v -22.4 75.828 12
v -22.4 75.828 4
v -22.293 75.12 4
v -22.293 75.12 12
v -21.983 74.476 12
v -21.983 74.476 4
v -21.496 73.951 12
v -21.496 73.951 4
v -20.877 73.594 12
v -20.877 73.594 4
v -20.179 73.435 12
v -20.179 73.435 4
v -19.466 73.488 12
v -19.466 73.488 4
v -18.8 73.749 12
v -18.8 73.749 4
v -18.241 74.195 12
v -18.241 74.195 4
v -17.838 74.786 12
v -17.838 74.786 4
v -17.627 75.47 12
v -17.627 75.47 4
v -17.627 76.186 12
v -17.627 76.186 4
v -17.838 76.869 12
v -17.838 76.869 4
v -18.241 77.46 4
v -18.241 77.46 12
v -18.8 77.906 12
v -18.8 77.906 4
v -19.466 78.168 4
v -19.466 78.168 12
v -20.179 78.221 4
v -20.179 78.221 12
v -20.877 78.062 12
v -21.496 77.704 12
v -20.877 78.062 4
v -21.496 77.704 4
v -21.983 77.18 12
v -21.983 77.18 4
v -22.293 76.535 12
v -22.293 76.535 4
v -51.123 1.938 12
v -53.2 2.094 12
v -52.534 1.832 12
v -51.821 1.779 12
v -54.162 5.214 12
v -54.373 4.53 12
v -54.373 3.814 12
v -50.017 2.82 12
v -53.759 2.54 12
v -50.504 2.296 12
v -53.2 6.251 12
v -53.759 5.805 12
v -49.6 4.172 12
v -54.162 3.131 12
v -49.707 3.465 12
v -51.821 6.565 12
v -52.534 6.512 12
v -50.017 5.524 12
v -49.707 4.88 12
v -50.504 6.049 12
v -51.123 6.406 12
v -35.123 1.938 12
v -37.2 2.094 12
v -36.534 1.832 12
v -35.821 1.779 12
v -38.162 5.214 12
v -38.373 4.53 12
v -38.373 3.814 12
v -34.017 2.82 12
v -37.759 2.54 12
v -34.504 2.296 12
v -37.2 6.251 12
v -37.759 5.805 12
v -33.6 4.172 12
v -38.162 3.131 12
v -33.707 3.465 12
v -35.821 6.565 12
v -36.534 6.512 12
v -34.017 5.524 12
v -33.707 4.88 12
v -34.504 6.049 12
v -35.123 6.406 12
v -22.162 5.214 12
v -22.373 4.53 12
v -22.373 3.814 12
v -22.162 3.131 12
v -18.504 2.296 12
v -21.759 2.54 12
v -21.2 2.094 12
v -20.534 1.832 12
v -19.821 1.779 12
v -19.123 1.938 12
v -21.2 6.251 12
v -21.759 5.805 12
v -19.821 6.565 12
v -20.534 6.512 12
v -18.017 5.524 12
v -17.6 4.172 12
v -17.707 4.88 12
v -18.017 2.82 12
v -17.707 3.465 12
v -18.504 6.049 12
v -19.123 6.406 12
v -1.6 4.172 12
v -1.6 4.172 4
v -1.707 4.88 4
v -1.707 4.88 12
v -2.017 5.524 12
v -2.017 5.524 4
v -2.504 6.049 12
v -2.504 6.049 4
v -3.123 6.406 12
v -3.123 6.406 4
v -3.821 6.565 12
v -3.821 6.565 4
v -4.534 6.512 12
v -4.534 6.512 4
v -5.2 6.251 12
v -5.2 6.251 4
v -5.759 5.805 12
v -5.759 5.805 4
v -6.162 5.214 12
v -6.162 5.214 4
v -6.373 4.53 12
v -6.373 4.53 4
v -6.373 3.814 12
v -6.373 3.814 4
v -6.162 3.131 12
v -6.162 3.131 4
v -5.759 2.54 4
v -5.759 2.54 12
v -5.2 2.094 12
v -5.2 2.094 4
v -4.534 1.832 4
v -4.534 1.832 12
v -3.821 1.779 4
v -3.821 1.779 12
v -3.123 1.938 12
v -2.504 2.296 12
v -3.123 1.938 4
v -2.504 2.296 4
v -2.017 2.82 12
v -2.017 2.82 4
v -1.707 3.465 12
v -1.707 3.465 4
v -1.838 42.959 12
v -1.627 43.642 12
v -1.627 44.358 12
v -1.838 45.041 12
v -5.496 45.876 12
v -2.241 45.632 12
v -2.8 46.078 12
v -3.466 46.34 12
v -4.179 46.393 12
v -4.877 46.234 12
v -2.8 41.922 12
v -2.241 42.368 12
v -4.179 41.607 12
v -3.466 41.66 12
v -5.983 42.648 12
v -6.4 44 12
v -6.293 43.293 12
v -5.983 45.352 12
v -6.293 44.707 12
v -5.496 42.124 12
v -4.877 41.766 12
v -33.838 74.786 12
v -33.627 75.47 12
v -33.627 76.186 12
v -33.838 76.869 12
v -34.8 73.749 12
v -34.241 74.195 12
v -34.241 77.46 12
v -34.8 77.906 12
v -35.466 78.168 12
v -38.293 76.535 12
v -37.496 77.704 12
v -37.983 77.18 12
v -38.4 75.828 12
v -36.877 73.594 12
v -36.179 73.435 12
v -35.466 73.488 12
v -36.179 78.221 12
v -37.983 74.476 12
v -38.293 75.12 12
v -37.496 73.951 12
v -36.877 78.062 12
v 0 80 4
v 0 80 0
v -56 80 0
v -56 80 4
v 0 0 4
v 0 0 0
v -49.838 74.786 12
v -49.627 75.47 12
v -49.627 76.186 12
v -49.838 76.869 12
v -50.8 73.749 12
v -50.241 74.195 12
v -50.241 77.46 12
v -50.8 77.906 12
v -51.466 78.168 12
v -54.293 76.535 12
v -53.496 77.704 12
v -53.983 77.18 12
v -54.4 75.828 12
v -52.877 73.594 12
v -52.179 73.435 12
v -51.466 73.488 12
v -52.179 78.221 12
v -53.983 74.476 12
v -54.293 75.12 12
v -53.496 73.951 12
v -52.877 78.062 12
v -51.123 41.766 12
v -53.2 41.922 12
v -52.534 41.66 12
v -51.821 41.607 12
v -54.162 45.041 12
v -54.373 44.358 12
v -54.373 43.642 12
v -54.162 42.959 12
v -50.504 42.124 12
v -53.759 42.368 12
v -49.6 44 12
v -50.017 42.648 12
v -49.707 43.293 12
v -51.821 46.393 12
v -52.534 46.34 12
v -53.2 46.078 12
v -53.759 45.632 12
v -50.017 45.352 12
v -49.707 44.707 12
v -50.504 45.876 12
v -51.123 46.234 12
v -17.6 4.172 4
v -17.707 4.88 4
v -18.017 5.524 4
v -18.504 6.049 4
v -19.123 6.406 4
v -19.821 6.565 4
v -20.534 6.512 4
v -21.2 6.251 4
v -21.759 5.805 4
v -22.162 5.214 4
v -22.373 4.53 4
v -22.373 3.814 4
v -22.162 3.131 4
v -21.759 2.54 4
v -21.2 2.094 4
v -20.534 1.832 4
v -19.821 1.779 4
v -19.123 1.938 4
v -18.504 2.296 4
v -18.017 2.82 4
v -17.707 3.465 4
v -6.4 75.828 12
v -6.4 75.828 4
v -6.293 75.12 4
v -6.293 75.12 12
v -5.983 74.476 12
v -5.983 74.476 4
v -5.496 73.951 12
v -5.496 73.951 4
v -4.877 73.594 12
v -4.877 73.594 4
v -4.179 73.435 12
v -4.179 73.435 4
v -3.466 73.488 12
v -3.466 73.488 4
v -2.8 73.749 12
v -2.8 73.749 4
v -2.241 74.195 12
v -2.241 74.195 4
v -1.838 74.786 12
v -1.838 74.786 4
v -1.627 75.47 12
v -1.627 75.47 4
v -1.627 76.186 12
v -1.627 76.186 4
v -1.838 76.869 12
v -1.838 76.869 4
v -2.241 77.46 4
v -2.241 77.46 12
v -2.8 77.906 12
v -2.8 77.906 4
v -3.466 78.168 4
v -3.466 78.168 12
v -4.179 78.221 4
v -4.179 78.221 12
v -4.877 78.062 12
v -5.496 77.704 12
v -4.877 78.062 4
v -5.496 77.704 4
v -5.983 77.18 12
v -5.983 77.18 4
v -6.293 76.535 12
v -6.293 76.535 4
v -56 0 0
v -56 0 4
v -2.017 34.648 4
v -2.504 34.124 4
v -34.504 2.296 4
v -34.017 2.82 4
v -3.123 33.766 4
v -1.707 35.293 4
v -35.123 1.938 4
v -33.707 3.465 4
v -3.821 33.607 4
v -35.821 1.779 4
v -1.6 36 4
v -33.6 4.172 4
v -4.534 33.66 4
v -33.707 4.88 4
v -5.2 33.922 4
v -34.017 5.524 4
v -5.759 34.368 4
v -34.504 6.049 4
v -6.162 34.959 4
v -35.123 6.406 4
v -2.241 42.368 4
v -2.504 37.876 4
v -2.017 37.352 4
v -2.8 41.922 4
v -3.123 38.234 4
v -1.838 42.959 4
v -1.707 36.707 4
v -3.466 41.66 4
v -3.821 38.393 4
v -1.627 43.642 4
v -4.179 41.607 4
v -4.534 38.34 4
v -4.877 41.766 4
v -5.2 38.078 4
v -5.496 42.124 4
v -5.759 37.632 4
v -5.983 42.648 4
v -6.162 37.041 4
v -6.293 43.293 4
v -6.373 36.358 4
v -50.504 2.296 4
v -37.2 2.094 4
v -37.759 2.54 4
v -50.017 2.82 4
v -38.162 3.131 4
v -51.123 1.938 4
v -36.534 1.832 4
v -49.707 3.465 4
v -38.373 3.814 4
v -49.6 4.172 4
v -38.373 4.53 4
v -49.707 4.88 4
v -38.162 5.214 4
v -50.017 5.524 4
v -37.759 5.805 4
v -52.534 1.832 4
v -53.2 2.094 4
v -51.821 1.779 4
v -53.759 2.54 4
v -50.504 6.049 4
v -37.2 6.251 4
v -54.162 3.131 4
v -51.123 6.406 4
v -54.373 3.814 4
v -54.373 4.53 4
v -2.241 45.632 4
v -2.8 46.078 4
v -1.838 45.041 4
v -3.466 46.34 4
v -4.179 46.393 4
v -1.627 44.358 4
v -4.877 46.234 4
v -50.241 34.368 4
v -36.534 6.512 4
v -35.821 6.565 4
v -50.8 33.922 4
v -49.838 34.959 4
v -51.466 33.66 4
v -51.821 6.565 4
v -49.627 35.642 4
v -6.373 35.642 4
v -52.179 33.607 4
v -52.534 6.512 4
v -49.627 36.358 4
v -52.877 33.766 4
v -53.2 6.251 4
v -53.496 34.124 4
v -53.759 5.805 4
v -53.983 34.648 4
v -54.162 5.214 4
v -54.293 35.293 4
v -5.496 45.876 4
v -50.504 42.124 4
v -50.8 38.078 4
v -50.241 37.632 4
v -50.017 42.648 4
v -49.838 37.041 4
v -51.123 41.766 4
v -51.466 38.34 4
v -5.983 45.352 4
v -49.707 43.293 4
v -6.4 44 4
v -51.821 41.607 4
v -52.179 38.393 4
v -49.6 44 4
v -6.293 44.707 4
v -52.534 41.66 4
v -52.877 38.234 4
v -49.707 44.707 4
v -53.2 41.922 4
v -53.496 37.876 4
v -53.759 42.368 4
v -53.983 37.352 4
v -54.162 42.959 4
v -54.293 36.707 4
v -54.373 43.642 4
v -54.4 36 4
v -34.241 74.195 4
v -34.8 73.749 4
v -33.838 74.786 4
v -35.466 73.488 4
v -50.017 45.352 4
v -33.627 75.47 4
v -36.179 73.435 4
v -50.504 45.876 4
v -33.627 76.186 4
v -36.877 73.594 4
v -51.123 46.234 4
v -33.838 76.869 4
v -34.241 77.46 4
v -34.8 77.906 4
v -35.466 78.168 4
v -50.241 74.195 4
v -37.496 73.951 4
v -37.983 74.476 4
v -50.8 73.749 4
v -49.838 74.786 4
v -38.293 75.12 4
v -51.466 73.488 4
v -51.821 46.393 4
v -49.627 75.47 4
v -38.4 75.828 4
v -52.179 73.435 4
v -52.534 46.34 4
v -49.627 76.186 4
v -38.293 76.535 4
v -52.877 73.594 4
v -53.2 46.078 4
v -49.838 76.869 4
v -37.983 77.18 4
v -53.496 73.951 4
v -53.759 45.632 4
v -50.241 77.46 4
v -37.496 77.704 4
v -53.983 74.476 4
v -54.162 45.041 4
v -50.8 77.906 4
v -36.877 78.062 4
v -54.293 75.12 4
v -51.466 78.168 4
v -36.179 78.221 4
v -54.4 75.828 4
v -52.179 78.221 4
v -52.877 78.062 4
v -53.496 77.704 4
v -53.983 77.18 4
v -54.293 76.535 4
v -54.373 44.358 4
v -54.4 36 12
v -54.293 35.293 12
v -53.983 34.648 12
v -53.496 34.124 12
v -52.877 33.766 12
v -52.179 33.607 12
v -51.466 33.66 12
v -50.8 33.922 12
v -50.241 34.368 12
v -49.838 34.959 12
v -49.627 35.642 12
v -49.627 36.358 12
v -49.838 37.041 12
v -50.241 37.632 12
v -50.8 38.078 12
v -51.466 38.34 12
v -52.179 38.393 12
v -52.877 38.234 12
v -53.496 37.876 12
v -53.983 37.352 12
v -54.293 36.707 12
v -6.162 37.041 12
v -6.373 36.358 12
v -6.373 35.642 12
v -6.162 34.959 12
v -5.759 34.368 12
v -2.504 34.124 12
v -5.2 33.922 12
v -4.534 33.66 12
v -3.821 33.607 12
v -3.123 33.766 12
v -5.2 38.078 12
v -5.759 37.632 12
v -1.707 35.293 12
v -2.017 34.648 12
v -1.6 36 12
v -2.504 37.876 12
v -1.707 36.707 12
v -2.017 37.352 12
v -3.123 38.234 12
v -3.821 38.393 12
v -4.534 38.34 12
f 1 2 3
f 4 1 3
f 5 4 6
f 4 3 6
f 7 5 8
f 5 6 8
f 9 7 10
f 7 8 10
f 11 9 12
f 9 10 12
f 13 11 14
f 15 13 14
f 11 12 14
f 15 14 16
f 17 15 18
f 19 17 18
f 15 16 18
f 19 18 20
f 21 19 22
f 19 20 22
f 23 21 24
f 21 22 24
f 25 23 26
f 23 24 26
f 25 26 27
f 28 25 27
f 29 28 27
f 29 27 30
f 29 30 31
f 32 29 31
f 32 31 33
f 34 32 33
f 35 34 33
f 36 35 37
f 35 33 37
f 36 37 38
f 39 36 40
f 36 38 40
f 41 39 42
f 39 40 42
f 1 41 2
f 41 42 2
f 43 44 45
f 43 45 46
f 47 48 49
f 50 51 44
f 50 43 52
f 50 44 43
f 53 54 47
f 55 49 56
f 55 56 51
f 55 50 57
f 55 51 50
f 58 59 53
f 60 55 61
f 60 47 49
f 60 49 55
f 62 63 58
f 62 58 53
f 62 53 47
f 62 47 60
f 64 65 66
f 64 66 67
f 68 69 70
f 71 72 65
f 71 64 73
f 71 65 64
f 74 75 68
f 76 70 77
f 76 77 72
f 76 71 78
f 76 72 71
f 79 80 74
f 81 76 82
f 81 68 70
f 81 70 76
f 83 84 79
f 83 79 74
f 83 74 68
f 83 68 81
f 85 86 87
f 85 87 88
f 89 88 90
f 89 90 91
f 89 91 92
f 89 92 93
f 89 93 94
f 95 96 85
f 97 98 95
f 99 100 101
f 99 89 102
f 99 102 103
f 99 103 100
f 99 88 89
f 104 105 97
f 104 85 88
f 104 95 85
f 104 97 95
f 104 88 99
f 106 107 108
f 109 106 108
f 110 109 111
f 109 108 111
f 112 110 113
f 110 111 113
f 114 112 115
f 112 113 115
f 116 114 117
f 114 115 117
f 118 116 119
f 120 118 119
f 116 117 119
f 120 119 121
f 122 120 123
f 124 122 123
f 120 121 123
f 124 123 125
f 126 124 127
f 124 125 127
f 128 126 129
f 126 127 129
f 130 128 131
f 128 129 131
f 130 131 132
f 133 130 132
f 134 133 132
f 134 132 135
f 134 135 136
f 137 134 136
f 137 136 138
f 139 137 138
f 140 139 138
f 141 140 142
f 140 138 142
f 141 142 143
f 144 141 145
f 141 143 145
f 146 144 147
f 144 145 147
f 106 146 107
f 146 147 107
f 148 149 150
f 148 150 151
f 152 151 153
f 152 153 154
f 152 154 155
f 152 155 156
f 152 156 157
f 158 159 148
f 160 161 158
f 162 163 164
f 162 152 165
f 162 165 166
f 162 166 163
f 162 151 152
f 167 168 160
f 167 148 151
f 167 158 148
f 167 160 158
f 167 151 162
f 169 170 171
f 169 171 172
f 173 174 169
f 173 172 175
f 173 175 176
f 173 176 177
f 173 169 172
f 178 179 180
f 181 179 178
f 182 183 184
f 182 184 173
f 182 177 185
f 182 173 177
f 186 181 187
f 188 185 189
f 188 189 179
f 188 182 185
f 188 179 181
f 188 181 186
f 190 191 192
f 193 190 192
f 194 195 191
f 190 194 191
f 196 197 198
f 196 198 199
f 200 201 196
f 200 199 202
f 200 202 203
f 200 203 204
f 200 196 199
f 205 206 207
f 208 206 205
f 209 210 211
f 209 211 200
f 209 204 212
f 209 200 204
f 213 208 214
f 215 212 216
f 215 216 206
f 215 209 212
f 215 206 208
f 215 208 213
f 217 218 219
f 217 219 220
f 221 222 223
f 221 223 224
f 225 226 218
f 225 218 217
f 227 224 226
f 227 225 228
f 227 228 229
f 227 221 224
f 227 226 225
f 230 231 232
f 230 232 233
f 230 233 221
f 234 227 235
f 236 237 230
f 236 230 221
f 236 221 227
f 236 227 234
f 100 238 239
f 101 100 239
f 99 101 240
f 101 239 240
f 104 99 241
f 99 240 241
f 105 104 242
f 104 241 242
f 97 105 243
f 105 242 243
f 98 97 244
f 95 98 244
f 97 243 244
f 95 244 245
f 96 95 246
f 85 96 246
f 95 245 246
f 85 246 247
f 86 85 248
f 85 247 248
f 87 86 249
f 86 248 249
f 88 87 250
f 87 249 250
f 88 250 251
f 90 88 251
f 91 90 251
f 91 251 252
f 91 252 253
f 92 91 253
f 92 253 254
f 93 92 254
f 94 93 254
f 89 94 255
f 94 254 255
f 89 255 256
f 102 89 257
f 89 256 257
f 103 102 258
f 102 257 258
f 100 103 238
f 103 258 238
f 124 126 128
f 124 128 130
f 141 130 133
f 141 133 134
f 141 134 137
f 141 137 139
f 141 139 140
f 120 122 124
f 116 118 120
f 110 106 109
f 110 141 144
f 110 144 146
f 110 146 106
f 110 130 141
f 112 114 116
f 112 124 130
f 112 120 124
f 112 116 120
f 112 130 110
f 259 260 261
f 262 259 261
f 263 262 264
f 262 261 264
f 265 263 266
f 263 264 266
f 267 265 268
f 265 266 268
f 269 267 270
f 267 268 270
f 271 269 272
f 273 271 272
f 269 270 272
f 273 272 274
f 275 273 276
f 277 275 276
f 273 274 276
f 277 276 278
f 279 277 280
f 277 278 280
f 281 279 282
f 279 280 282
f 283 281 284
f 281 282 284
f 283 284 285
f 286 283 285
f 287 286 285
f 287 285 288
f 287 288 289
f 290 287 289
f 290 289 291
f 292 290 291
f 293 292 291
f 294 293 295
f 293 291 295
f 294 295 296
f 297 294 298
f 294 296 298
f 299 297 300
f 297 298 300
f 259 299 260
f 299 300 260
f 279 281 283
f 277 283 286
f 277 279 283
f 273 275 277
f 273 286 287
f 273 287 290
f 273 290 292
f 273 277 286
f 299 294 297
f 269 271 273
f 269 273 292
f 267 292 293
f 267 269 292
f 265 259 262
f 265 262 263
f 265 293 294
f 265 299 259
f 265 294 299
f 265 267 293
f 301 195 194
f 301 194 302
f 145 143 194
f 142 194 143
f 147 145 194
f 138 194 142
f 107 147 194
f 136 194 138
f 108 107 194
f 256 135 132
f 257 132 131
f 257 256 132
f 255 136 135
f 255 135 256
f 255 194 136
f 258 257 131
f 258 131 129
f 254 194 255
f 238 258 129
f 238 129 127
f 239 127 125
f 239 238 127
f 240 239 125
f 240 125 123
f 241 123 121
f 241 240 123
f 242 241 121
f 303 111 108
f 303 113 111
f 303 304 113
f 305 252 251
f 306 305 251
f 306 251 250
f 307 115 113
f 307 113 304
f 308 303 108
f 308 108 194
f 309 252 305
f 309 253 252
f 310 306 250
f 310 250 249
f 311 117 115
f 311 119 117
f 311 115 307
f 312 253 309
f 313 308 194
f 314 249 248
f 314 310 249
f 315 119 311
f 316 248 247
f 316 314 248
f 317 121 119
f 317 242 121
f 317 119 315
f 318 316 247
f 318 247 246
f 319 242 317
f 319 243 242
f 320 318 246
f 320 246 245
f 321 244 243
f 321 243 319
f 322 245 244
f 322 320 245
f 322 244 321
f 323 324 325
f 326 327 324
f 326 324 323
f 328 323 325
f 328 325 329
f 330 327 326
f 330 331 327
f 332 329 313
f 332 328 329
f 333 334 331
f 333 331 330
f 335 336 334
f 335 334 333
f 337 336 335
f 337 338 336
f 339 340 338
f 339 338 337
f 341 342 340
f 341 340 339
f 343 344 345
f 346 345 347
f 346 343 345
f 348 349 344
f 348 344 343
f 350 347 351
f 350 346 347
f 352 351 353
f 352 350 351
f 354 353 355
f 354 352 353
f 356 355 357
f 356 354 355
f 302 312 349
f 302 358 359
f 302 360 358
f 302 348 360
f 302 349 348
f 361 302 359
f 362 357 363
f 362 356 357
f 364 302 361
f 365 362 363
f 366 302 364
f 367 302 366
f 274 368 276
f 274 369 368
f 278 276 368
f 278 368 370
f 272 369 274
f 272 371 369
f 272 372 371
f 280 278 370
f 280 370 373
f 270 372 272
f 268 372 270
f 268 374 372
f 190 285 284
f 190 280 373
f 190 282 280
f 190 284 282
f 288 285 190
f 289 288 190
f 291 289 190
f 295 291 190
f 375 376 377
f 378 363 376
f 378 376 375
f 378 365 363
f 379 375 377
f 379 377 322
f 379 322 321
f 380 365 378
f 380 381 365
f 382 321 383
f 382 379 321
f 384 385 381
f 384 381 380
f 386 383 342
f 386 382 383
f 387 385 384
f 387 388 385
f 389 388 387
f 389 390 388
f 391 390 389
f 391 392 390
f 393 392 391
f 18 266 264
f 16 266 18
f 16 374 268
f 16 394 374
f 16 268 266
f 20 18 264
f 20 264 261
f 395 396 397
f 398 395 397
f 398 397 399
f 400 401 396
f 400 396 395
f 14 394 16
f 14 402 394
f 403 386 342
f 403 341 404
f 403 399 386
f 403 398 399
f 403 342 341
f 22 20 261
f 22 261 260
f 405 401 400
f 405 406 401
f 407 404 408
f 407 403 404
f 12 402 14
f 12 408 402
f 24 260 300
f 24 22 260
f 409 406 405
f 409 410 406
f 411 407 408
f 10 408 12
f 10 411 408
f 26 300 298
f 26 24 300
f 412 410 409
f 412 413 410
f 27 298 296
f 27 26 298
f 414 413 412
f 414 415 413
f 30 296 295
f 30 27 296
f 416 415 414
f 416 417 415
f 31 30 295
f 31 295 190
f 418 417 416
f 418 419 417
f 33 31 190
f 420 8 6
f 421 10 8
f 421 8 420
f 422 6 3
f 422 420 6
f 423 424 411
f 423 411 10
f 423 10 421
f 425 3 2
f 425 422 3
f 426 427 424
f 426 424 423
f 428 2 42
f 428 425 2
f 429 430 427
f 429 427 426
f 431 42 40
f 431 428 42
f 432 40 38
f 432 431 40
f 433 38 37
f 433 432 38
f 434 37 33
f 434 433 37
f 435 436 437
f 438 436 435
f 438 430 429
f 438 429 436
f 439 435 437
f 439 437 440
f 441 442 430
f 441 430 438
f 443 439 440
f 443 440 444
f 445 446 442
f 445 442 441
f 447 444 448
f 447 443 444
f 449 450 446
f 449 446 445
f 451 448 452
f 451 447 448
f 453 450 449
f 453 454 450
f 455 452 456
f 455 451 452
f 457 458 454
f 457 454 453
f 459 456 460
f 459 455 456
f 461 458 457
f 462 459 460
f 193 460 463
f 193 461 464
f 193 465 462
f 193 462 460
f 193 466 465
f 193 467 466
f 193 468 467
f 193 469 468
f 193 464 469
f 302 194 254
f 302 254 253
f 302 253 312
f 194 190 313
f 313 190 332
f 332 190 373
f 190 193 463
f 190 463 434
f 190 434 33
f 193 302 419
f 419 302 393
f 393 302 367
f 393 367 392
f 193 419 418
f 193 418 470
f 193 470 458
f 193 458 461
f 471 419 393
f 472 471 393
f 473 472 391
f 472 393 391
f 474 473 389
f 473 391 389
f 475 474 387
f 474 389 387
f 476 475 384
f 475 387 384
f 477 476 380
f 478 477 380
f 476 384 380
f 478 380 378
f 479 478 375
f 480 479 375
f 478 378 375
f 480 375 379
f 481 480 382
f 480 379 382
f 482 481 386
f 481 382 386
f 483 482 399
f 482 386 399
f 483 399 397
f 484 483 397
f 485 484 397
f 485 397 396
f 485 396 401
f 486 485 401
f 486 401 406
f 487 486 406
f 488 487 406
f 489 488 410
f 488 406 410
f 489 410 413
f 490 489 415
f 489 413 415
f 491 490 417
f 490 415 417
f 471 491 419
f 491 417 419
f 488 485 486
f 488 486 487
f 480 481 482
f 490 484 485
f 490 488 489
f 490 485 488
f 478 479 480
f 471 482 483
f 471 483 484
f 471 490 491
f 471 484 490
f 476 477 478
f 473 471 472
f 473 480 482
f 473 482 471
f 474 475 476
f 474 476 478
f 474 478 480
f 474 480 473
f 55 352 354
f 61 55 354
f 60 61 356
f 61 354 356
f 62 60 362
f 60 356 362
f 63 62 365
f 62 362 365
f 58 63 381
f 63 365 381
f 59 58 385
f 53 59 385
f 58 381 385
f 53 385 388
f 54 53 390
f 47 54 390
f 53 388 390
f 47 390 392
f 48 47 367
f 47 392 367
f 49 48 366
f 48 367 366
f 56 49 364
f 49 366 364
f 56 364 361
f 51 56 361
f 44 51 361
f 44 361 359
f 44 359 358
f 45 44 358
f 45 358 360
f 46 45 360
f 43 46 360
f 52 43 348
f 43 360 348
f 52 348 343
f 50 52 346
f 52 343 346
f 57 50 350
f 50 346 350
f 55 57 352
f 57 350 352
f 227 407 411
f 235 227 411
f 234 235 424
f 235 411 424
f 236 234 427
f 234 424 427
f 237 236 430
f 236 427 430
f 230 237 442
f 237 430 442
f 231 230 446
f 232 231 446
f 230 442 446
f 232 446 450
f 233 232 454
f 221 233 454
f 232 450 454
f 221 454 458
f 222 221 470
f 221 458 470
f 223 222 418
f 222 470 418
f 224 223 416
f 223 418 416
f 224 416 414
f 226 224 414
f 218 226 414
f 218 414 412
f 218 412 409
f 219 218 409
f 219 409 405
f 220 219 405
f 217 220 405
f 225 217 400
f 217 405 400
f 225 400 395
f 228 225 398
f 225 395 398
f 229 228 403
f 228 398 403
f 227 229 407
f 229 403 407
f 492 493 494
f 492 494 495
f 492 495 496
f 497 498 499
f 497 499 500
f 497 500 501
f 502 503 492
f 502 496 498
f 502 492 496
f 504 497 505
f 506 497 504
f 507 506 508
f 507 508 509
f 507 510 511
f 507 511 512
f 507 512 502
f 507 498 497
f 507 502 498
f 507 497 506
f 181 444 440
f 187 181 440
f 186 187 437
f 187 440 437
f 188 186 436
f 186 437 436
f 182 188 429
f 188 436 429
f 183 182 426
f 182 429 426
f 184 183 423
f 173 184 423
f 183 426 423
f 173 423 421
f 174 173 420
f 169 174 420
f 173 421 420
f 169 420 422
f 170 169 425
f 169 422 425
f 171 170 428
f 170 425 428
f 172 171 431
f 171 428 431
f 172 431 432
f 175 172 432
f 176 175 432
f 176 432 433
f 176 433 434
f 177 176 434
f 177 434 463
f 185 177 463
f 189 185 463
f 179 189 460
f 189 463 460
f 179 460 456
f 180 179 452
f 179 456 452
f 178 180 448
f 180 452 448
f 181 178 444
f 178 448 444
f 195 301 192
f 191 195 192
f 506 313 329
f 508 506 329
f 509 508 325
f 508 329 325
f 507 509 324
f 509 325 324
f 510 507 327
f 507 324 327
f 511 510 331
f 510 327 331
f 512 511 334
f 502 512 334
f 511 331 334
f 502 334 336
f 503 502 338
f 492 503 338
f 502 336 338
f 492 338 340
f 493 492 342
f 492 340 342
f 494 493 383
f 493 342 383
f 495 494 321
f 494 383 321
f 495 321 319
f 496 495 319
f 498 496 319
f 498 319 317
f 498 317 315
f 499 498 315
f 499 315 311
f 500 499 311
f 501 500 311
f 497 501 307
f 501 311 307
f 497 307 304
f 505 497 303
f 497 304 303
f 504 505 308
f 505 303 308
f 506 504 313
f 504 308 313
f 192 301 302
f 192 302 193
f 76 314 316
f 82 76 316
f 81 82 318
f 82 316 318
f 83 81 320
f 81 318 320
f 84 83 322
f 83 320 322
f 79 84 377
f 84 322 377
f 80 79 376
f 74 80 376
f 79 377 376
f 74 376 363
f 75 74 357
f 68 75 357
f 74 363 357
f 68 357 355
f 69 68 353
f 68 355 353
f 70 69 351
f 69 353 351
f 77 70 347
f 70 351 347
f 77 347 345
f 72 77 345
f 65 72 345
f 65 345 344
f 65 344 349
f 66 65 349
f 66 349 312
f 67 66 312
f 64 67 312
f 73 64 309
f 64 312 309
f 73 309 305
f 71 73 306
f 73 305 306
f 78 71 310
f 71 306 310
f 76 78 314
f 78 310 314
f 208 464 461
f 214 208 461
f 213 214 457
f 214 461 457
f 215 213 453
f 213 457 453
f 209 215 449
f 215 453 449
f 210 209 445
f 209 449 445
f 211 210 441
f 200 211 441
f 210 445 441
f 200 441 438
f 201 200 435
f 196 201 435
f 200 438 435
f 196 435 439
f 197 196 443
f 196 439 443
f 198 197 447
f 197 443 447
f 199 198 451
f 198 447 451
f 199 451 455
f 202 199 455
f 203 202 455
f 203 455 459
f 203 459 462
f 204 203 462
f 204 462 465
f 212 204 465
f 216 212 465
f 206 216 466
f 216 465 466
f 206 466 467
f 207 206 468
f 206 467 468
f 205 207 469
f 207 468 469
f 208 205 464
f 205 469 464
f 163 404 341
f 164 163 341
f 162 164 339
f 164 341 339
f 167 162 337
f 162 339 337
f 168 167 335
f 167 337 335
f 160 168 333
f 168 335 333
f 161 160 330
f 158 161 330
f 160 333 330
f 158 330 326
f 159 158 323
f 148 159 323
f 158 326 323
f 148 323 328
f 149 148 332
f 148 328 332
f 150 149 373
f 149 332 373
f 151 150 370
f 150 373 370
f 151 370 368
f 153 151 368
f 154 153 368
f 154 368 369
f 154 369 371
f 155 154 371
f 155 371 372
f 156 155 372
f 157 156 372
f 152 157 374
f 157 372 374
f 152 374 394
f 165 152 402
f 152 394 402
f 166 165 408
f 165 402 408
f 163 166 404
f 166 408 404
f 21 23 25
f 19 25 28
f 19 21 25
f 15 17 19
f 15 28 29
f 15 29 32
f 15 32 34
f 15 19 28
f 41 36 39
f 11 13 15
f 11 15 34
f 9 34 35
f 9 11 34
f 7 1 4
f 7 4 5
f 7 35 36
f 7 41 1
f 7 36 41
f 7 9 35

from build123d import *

# Parameters (mm, degrees)
SKETCH1_W           = 80
SKETCH1_H           = 56
BOSS_EXTRUDE1_DEPTH = 4
SKETCH2_R           = 2.4
BOSS_EXTRUDE2_DEPTH = 8


with BuildPart() as part:
    # Sketch1 → Boss-Extrude1 (new body)
    with BuildSketch(Plane(origin=(0, 0, 0), x_dir=(0, 1, 0), z_dir=(0, 0, 1))):
        with Locations((40, 28)):
            Rectangle(SKETCH1_W, SKETCH1_H)
    extrude(amount=BOSS_EXTRUDE1_DEPTH)

    # Sketch2 → Boss-Extrude2 (add)
    with BuildSketch(Plane.XY.offset(4)):
        with Locations((-4, 4.172184478)):
            Circle(SKETCH2_R)
        with Locations((-20, 4.172184478)):
            Circle(SKETCH2_R)
        with Locations((-36, 4.172184478)):
            Circle(SKETCH2_R)
        with Locations((-52, 4.172184478)):
            Circle(SKETCH2_R)
        with Locations(Location((-52, 75.827815522, 0), (0, 0, 180))):
            Circle(SKETCH2_R)
        with Locations(Location((-36, 75.827815522, 0), (0, 0, 180))):
            Circle(SKETCH2_R)
        with Locations(Location((-20, 75.827815522, 0), (0, 0, 180))):
            Circle(SKETCH2_R)
        with Locations(Location((-4, 75.827815522, 0), (0, 0, 180))):
            Circle(SKETCH2_R)
        with Locations((-4, 36)):
            Circle(SKETCH2_R)
        with Locations(Location((-4, 44, 0), (0, 0, 180))):
            Circle(SKETCH2_R)
        with Locations((-52, 44)):
            Circle(SKETCH2_R)
        with Locations(Location((-52, 36, 0), (0, 0, 180))):
            Circle(SKETCH2_R)
    extrude(amount=BOSS_EXTRUDE2_DEPTH)


solid = part.part
